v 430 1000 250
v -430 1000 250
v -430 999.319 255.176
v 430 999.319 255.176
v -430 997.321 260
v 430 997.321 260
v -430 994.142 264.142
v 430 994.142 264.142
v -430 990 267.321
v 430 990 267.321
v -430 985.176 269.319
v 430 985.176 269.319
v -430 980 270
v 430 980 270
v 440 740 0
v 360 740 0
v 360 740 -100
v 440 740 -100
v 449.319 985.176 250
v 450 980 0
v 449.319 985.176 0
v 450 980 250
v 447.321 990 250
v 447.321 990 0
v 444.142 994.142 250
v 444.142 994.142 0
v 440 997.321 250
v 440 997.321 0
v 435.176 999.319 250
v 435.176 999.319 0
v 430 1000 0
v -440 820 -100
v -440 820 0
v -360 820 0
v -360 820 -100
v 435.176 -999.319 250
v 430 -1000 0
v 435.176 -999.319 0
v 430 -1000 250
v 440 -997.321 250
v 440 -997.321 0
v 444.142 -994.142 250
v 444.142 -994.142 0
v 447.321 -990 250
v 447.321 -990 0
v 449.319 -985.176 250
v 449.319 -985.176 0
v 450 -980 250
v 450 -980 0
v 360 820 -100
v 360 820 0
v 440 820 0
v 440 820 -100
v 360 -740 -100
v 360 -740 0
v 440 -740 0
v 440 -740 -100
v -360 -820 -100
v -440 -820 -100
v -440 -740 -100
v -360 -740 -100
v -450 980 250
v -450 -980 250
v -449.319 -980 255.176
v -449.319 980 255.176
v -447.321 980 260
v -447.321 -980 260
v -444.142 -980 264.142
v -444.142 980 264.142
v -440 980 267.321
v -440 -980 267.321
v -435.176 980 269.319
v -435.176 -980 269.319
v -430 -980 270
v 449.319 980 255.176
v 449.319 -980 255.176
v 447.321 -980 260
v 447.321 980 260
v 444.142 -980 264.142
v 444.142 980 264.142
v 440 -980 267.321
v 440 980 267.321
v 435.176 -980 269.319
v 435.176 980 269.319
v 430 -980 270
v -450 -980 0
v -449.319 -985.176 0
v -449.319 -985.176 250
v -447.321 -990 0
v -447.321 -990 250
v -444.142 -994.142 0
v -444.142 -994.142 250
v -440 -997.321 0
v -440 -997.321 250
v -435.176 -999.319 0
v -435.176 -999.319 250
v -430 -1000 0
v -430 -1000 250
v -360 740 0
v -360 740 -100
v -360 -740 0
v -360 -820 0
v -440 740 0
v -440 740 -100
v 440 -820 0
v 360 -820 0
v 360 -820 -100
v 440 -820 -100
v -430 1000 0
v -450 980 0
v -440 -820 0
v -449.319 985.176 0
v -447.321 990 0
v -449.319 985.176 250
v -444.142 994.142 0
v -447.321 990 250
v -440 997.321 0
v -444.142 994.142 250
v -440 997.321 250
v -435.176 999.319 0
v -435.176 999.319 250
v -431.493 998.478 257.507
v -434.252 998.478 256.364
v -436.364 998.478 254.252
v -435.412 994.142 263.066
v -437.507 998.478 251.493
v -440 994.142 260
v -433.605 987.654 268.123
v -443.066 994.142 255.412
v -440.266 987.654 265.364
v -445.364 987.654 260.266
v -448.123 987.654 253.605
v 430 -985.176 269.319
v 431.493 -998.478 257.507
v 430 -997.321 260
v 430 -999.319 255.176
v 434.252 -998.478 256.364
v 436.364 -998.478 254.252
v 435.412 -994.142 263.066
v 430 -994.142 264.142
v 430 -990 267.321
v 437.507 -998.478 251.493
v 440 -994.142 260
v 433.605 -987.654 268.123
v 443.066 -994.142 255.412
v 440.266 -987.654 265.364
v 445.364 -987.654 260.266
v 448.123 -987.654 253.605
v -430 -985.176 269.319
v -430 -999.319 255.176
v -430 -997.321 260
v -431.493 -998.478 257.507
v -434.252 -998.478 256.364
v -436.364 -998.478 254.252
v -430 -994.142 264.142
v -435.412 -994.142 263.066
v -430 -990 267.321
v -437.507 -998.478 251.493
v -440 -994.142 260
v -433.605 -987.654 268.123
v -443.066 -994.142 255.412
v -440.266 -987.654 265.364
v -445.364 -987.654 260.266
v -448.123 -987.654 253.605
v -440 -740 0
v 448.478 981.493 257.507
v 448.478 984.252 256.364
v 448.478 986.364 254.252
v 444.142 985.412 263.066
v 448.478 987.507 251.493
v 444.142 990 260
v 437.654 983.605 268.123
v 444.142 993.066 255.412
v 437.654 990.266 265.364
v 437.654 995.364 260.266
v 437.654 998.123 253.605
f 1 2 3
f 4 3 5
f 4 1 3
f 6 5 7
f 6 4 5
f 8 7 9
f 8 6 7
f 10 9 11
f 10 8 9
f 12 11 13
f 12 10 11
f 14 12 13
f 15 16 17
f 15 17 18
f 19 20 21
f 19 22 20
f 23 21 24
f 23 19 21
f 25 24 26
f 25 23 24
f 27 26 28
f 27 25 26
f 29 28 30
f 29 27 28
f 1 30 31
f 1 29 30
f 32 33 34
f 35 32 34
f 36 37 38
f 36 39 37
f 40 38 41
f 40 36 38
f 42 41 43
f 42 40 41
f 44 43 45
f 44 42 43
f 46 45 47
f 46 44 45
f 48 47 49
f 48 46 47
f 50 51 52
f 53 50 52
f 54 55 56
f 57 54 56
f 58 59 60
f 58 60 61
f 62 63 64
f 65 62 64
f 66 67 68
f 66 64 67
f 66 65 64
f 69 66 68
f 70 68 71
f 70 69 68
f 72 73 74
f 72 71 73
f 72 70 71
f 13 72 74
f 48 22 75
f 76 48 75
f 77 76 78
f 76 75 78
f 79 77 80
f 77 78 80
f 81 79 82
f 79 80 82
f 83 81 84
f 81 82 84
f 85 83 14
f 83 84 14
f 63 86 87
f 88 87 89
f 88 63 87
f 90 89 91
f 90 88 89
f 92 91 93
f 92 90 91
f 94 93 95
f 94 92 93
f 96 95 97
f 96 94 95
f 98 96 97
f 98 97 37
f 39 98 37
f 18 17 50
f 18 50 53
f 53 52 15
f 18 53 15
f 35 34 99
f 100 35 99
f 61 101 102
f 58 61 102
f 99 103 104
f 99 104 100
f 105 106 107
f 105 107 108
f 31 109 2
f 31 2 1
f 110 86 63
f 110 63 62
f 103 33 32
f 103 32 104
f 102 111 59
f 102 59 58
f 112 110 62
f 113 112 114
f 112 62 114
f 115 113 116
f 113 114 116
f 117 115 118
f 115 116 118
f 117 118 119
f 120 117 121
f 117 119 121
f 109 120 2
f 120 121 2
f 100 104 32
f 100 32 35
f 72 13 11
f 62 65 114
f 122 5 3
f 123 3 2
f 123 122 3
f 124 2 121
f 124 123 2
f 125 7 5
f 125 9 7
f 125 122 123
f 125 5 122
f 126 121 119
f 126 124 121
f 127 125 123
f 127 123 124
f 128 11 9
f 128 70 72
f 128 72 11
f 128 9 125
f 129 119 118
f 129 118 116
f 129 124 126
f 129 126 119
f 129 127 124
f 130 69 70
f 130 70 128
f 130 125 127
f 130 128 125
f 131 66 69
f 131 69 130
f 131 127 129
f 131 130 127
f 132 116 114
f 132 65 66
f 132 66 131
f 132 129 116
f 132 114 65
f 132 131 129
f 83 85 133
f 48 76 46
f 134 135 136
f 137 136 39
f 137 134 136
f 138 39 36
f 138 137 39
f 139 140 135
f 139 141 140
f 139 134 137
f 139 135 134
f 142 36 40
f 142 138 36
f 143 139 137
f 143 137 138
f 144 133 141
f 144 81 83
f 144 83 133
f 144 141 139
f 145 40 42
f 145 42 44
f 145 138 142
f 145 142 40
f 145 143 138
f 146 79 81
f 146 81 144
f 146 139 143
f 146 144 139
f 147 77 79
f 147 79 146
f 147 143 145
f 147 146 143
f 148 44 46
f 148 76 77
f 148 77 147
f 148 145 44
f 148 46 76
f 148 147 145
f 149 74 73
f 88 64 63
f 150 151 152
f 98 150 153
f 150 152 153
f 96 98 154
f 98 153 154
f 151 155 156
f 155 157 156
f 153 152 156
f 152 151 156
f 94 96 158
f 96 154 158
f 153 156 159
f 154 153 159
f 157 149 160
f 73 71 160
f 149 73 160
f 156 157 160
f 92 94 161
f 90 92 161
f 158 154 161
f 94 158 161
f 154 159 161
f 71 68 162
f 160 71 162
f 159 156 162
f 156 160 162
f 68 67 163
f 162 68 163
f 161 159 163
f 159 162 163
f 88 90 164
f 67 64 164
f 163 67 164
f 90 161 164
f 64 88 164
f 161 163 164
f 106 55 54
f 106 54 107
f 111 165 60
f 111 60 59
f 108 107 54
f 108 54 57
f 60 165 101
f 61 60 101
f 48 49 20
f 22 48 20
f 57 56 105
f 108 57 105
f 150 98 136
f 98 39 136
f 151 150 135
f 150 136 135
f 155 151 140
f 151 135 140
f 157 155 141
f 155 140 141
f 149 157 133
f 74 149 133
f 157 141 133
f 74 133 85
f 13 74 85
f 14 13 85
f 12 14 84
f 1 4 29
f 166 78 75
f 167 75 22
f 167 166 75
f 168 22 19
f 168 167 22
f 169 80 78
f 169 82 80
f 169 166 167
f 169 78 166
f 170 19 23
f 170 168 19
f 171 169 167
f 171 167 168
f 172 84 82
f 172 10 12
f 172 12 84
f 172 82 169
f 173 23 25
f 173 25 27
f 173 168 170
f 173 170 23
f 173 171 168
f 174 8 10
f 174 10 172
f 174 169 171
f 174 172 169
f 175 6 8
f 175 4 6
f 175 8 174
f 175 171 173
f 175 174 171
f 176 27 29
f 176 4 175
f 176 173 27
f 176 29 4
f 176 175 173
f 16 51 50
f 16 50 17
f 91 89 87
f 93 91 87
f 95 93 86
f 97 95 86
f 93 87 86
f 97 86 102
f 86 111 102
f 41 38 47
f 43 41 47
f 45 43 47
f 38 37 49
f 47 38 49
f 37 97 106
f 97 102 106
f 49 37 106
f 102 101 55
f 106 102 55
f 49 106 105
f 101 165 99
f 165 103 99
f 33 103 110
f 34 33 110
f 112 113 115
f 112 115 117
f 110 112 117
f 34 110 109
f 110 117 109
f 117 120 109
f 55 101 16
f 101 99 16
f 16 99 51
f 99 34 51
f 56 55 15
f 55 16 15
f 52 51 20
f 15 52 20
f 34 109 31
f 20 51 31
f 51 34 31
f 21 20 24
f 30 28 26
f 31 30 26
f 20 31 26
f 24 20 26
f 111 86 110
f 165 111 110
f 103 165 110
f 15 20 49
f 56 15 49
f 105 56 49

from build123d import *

# Parameters (mm, degrees)
F0_W     = 900
F0_H     = 2000
F1_DEPTH = 270
F2_R     = 20
F3_W     = 80
F3_H     = 80
F4_DEPTH = 100


with BuildPart() as f1:
    # F0 (on Top) → F1 (new body)
    with BuildSketch(Plane.XY):
        Rectangle(F0_W, F0_H)
    extrude(amount=F1_DEPTH)

    # F2
    f2_edges = [f1.edges().sort_by_distance(p)[0] for p in [
        (-450, 0, 270),
        (0, 1000, 270),
        (450, 0, 270),
        (0, -1000, 270),
        (450, -1000, 135),
        (450, 1000, 135),
        (-450, 1000, 135),
        (-450, -1000, 135),
    ]]
    fillet(f2_edges, radius=F2_R)

    # F3 (on face) → F4 (join)
    with BuildSketch(Plane(origin=(0, 0, 0), x_dir=(1, 0, 0), z_dir=(0, 0, -1))):
        with Locations((-400, 780)):
            Rectangle(F3_W, F3_H)
        with Locations((400, 780)):
            Rectangle(F3_W, F3_H)
        with Locations((400, -780)):
            Rectangle(F3_W, F3_H)
        with Locations((-400, -780)):
            Rectangle(F3_W, F3_H)
    extrude(amount=F4_DEPTH)


solid = f1.part
